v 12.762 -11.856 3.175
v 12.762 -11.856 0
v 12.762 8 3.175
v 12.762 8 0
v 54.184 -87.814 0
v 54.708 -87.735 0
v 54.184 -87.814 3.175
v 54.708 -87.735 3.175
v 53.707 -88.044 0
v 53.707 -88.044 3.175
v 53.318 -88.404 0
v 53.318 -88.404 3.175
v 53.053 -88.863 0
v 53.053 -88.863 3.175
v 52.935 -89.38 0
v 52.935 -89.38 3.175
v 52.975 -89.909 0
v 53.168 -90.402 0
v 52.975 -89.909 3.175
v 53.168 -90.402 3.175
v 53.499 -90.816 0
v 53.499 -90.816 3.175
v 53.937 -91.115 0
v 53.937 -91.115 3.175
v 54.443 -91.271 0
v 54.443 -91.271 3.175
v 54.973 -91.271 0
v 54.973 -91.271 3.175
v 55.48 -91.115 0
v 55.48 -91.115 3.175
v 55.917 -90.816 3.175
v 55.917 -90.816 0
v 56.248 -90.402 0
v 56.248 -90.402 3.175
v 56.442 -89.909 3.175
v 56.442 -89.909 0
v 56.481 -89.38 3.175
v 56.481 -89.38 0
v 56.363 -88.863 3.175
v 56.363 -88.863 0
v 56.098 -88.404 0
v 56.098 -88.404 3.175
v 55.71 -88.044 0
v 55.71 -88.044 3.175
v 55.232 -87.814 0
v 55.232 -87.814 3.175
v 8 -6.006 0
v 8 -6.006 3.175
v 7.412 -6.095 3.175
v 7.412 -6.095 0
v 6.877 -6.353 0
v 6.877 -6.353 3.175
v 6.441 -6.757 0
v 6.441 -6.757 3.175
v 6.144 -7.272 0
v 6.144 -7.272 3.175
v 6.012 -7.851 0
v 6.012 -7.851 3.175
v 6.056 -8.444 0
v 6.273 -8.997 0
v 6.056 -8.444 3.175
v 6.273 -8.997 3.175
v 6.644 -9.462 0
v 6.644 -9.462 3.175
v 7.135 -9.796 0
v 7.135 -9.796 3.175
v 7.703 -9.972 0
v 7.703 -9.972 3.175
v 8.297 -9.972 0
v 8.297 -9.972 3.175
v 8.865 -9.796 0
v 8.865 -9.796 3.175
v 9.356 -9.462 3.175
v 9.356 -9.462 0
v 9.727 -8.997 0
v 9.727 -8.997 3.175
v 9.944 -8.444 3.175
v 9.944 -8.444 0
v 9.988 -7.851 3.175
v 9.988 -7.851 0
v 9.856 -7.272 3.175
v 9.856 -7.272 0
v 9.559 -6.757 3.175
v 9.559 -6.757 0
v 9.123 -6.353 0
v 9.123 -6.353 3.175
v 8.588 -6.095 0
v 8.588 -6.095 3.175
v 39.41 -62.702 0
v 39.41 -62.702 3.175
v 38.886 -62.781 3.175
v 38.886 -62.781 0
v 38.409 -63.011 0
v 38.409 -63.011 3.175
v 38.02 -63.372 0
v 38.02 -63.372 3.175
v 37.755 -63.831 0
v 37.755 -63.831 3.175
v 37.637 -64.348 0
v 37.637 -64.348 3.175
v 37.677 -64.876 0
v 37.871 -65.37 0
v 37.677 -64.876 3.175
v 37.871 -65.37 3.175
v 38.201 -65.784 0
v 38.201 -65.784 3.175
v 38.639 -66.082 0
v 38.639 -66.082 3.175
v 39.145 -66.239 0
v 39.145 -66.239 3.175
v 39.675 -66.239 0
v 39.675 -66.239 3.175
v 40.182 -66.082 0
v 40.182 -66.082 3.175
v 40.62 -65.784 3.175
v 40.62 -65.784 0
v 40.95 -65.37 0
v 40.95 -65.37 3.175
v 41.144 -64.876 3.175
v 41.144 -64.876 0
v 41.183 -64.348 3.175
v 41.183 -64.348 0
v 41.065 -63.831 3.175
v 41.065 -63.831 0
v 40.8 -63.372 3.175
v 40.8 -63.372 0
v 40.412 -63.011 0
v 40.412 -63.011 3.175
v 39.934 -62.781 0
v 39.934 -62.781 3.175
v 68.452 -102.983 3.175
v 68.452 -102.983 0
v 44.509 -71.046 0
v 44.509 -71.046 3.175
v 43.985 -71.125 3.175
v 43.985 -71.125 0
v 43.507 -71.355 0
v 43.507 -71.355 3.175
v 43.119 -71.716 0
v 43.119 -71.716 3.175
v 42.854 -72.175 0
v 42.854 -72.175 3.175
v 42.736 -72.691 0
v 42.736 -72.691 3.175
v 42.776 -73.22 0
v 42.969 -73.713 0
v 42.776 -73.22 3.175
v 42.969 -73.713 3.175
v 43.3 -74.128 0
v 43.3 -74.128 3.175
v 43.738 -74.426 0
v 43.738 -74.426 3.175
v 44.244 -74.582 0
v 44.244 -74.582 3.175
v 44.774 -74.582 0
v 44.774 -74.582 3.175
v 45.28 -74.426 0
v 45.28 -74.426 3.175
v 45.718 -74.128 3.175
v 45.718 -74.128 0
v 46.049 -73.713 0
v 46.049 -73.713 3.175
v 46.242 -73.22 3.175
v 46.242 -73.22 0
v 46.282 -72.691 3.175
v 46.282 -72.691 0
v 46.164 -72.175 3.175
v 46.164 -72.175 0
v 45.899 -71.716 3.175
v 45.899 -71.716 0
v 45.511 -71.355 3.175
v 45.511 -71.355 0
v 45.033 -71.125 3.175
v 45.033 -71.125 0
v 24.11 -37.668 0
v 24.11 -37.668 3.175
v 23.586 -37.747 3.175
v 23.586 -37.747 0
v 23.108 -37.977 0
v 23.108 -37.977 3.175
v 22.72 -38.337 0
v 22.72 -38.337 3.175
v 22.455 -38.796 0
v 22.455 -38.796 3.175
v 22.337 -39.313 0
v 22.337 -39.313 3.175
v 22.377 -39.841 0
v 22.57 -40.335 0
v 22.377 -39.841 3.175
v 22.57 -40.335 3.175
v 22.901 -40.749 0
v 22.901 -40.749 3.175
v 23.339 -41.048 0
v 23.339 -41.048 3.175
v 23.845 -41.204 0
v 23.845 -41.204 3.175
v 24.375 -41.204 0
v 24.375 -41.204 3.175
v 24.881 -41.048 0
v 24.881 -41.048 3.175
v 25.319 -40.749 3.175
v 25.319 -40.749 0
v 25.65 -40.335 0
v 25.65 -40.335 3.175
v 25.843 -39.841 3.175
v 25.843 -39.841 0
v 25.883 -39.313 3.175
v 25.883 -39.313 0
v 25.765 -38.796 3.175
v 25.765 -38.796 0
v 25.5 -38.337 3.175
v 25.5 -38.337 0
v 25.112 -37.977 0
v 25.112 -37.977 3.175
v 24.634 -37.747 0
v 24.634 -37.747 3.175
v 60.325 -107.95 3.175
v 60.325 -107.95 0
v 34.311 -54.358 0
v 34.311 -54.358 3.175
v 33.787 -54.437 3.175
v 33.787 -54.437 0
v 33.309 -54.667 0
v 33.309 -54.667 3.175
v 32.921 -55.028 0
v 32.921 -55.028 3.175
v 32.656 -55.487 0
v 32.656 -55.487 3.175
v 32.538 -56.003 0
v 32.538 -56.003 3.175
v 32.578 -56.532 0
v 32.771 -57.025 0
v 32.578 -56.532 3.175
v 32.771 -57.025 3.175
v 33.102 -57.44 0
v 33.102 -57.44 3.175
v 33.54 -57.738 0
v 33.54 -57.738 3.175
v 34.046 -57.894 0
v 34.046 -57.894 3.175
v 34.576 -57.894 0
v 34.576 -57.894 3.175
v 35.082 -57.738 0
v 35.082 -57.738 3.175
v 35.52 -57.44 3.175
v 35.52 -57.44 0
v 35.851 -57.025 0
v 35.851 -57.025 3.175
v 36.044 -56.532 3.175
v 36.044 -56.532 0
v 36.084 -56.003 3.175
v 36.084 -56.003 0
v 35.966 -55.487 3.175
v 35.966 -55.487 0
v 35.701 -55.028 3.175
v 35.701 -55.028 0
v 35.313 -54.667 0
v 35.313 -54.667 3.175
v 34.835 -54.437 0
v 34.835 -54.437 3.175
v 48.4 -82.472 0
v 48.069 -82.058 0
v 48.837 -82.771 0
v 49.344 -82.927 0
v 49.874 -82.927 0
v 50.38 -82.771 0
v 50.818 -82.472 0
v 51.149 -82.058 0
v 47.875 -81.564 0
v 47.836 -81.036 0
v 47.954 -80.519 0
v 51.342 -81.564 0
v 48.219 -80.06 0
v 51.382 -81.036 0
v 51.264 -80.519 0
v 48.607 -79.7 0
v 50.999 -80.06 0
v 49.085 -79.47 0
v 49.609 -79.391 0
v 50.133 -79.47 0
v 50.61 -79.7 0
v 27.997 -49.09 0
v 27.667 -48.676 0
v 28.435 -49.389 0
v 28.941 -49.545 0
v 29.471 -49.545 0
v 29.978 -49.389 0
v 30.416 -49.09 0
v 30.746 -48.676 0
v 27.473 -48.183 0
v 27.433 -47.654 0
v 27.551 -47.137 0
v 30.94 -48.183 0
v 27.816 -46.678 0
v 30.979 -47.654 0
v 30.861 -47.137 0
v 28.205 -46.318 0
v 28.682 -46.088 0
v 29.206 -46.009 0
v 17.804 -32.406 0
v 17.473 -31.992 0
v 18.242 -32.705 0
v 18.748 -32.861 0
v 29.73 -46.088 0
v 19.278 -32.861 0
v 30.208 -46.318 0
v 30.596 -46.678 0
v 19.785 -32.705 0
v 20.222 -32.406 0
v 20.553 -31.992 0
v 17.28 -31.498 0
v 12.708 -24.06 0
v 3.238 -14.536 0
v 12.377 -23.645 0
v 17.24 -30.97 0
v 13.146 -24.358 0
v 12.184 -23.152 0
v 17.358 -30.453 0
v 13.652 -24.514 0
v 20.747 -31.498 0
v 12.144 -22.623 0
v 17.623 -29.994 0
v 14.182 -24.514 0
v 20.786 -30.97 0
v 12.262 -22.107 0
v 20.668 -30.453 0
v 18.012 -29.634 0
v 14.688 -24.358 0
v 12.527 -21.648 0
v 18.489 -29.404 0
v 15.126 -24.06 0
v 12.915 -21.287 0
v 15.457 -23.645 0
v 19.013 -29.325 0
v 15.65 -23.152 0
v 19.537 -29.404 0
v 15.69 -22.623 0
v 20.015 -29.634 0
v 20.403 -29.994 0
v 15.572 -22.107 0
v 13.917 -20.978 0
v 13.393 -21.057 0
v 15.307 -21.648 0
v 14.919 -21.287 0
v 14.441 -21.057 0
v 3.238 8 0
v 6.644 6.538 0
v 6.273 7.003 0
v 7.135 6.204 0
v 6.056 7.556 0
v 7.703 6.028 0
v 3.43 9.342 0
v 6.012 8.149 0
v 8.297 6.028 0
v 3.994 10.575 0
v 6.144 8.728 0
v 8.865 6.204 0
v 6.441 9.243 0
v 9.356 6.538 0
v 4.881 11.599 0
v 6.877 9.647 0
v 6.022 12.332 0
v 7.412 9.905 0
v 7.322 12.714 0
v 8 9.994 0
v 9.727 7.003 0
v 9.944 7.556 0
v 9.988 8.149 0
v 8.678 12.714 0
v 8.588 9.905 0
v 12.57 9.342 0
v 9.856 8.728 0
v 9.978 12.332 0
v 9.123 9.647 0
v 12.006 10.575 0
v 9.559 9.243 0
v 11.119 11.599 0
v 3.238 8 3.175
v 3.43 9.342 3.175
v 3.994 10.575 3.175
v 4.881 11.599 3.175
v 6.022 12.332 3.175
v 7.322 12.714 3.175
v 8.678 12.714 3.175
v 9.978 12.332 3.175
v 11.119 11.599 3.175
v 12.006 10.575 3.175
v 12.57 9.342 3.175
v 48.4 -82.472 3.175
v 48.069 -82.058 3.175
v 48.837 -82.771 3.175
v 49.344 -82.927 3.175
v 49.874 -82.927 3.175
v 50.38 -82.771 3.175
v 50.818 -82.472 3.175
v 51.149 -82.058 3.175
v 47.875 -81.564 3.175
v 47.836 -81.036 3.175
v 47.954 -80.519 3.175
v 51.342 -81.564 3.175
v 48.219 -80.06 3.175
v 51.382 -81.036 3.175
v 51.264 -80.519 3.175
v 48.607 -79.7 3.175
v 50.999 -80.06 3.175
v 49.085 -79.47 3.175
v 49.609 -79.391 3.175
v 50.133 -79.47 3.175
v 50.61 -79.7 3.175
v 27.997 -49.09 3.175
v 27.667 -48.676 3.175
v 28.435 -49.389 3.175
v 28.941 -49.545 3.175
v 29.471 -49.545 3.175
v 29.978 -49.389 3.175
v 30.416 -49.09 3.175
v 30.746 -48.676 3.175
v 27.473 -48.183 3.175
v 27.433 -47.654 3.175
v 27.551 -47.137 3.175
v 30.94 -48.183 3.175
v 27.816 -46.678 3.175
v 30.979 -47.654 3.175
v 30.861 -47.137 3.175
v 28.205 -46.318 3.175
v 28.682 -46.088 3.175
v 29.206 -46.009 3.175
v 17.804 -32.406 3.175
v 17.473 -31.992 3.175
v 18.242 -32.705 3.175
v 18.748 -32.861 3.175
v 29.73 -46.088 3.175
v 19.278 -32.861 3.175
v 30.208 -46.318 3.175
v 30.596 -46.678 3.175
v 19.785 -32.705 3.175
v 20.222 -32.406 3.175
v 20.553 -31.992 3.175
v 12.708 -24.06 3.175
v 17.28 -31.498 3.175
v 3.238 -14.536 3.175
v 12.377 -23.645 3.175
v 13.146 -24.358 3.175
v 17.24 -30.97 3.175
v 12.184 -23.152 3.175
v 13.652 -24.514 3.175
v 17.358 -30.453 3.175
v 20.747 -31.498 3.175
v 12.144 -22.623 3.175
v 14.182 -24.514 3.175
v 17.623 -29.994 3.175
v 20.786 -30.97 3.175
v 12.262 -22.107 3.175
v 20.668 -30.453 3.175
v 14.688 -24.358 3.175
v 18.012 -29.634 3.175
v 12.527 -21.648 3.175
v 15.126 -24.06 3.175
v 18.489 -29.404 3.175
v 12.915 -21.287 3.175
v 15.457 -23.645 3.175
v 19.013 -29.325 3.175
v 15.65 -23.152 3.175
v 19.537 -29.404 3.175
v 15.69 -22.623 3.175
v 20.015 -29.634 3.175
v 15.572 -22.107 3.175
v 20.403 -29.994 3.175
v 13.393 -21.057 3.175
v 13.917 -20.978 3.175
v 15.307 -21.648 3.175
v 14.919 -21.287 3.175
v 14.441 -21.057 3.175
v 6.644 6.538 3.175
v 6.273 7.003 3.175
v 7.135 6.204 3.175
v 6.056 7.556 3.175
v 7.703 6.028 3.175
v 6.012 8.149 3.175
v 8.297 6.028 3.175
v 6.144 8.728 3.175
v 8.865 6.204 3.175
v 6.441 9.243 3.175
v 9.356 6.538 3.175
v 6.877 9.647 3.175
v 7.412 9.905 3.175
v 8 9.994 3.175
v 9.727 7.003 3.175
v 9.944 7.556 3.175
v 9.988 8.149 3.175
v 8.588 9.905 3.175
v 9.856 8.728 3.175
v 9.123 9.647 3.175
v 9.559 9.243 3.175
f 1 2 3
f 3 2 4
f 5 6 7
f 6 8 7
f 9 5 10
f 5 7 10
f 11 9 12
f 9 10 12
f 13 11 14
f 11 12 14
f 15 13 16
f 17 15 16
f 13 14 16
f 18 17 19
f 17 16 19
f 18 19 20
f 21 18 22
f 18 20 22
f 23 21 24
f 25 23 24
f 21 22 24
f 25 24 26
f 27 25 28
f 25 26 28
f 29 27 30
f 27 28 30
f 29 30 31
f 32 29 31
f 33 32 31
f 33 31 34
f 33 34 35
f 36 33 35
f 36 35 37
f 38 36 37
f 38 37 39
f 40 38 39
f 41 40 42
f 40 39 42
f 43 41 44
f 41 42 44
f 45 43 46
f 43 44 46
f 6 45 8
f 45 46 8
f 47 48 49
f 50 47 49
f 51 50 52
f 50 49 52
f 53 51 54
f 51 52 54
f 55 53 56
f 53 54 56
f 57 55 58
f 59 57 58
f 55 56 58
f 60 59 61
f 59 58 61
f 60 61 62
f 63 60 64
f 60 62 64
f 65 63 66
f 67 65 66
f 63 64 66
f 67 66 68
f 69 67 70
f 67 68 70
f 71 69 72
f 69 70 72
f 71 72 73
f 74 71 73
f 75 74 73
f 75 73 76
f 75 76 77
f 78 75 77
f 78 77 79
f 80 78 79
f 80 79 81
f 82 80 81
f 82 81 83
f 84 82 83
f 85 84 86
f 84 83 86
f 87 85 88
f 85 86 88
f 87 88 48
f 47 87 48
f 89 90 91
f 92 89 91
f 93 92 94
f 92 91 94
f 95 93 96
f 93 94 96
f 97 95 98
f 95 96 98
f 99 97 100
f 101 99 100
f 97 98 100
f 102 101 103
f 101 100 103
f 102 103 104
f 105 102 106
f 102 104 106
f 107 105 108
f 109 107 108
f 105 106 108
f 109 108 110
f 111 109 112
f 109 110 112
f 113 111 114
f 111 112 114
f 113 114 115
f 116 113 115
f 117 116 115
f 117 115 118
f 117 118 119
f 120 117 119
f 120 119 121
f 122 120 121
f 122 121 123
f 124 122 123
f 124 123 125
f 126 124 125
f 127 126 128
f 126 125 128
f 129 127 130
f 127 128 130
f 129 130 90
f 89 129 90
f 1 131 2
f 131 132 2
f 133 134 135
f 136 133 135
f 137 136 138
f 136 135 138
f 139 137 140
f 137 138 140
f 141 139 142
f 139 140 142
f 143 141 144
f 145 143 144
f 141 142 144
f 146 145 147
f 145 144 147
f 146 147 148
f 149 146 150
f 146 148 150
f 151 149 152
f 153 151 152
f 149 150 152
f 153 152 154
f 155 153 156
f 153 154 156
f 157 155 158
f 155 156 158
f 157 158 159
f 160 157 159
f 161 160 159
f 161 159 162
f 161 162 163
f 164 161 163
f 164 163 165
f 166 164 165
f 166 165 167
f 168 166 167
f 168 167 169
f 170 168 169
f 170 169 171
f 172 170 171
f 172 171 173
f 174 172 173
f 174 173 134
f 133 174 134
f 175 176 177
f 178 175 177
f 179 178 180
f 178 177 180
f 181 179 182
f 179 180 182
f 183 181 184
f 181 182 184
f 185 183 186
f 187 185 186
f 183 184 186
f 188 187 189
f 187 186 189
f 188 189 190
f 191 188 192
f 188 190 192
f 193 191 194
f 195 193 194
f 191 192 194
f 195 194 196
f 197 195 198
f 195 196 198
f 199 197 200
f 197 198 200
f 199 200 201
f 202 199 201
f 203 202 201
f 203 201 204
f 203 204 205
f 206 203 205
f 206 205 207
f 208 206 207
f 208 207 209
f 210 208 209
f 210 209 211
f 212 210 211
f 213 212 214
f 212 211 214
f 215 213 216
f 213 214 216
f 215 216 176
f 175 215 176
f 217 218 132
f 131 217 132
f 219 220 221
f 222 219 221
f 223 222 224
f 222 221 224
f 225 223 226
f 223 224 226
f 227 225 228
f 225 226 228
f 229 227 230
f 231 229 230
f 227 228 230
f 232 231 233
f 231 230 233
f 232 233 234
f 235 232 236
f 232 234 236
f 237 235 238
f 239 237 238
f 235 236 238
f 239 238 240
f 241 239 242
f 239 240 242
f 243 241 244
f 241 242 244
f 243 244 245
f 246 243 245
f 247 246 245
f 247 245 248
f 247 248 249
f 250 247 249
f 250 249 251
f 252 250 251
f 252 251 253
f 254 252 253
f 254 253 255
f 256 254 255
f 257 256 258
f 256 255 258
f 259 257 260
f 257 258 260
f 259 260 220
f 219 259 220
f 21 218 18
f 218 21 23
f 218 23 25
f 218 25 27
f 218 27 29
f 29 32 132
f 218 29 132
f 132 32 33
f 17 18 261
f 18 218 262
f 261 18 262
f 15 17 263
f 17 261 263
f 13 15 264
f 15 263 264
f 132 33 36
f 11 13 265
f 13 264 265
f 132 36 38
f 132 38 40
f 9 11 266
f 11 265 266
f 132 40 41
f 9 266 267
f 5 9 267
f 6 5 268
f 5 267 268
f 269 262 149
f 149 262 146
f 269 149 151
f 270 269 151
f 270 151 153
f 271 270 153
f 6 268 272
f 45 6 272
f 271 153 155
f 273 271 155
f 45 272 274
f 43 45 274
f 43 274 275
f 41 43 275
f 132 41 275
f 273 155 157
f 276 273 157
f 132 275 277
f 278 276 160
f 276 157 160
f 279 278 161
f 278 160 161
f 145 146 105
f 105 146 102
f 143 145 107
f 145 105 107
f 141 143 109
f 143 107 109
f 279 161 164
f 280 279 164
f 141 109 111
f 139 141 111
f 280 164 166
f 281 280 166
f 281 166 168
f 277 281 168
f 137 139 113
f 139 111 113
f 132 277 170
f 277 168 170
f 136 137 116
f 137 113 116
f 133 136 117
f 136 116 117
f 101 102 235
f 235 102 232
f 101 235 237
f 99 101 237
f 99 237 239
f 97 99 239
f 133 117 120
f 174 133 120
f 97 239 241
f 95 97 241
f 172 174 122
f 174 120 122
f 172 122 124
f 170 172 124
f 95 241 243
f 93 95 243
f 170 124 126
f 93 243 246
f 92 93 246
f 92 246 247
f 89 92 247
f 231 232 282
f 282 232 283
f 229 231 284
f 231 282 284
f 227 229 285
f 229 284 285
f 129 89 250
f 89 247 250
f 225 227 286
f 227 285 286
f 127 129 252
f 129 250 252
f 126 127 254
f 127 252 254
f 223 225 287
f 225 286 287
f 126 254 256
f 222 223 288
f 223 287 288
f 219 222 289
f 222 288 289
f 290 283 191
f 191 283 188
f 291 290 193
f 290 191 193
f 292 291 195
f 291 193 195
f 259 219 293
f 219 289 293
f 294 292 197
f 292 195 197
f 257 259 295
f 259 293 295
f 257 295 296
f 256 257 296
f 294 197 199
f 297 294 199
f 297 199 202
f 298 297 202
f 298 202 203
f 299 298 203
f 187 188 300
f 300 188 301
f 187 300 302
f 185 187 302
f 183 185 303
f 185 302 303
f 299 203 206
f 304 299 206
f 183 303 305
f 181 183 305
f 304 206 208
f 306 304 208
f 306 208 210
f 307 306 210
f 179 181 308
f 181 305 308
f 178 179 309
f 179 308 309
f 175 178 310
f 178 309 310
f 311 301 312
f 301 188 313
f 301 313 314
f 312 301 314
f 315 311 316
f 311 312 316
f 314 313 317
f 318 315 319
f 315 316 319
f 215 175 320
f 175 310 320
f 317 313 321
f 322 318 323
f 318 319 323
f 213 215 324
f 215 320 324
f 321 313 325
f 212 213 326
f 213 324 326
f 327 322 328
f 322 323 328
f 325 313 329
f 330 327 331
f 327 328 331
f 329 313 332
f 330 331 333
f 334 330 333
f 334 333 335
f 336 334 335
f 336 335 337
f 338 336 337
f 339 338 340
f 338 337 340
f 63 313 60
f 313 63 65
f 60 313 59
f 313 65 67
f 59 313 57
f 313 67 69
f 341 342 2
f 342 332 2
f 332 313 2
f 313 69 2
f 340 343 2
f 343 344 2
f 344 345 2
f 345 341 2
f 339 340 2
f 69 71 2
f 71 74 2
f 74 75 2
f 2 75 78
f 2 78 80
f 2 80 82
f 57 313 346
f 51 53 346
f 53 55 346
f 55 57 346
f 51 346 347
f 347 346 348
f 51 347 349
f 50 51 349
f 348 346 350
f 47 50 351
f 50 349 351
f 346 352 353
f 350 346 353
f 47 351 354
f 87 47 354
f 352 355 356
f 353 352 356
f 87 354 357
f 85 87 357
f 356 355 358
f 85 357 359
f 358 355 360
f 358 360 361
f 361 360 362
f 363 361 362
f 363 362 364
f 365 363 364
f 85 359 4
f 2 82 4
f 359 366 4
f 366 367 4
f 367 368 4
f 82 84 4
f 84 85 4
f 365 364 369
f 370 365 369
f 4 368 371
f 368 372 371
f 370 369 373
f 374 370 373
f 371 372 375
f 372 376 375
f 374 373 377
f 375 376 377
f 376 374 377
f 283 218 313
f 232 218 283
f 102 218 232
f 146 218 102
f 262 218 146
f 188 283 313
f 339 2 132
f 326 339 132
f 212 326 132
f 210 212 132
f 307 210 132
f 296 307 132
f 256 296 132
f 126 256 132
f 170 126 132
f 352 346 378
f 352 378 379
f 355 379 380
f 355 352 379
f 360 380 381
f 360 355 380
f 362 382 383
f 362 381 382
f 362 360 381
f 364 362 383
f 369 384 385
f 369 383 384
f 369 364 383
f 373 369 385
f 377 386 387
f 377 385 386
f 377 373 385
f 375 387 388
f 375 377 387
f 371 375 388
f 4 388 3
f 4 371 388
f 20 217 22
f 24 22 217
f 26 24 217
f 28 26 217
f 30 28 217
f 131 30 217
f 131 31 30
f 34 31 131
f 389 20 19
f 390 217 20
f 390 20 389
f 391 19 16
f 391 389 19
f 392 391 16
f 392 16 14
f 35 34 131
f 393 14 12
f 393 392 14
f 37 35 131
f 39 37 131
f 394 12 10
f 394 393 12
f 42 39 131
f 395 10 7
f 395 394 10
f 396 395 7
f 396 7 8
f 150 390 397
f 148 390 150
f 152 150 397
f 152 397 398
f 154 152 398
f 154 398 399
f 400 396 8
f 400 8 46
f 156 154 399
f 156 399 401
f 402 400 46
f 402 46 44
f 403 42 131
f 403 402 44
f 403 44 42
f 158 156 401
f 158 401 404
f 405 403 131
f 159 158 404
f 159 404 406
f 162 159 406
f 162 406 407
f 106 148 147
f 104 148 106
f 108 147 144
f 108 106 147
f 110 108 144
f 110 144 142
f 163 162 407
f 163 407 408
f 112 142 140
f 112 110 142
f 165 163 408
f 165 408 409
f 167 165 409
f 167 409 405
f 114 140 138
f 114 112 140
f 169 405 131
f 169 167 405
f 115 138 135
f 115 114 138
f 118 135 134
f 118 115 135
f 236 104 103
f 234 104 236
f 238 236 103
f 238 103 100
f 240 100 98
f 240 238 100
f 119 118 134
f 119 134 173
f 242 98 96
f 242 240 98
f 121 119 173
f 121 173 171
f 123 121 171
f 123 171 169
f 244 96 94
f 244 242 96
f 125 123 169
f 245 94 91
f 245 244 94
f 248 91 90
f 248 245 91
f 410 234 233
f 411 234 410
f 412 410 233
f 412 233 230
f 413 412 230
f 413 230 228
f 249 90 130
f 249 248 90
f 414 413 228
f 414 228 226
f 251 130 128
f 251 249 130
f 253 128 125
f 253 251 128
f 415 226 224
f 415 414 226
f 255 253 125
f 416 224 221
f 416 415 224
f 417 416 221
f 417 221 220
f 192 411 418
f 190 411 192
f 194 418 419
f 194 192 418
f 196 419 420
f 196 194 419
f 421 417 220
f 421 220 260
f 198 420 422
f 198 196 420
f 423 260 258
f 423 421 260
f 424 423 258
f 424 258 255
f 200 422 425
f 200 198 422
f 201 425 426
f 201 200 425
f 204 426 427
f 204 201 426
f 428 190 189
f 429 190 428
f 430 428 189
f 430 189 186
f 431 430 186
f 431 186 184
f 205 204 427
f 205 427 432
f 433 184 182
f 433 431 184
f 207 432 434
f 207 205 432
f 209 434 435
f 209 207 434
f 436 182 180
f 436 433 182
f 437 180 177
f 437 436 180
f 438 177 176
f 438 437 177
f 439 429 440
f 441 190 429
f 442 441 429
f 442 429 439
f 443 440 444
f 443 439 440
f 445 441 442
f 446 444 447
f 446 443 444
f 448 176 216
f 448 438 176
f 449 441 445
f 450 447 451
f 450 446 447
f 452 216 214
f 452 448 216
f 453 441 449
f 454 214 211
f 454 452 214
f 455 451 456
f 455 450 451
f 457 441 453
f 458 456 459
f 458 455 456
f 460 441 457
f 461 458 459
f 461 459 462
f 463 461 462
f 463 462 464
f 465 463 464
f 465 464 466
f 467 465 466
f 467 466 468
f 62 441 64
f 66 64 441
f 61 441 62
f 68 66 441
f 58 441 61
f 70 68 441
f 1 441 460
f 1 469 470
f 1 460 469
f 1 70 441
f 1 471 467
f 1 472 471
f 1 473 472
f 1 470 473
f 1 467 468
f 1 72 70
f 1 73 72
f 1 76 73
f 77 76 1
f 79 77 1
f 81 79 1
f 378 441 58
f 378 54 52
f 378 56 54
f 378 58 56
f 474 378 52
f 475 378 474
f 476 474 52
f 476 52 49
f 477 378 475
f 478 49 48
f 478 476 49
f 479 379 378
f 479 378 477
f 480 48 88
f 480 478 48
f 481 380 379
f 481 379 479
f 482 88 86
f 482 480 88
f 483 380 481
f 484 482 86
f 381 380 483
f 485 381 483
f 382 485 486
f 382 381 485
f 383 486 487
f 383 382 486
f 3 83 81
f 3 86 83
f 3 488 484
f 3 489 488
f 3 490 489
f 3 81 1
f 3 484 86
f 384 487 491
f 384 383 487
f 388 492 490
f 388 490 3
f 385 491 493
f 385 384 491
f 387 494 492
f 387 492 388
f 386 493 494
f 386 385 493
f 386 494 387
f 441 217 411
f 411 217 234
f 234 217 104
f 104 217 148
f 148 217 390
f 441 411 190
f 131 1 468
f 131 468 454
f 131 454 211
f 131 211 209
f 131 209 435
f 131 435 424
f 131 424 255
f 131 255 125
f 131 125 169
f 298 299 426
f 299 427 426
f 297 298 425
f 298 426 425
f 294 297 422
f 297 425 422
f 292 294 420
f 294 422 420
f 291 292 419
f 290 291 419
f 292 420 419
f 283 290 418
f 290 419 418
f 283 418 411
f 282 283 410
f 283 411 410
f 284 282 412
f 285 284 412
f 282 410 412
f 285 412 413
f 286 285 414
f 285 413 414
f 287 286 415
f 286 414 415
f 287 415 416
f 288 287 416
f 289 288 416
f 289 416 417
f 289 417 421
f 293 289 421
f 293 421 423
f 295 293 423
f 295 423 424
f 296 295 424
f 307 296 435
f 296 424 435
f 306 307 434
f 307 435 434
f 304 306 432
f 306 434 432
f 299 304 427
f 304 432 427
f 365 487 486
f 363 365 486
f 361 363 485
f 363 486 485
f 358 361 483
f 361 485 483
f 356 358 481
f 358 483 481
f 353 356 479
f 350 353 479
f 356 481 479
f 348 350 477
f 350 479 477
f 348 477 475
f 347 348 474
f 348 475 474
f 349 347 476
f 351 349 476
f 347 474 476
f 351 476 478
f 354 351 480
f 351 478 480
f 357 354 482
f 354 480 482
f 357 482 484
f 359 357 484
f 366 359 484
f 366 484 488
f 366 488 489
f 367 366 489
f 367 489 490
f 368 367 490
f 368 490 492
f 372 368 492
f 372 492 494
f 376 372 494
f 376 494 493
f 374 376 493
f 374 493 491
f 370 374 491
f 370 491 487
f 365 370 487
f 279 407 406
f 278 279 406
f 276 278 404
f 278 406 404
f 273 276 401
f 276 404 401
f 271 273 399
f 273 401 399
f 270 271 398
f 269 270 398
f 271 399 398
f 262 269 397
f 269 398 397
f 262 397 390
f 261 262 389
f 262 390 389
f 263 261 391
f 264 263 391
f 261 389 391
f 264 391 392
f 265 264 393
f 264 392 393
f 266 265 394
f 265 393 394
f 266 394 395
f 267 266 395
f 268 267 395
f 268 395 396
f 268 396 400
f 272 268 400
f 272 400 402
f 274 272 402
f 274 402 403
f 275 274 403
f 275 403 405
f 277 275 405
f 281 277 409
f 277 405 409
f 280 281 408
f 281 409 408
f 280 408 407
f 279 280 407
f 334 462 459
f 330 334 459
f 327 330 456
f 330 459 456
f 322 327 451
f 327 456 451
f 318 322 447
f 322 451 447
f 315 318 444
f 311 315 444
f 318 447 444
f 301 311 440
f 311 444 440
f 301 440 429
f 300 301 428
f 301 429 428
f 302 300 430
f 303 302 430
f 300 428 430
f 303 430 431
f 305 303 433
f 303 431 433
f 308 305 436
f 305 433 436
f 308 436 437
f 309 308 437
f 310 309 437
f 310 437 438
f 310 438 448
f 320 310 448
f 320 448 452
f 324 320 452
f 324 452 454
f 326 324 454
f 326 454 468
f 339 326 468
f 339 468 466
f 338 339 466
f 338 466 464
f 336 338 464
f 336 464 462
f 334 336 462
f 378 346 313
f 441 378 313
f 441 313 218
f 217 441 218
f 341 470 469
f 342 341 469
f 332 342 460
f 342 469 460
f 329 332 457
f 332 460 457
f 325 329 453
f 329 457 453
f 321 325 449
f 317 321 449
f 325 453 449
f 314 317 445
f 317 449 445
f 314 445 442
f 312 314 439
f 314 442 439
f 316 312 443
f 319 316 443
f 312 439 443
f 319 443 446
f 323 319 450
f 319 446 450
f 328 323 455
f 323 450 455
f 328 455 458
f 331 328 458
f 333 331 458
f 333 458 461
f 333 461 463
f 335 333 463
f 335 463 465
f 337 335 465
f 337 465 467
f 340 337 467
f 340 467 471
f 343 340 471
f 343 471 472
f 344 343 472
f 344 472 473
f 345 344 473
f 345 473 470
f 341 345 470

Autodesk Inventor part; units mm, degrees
ref_plane "YZ Plane" through (0, 0, 0) normal (1, 0, 0) x (0, 1, 0)
ref_plane "XZ Plane" through (0, 0, 0) normal (0, 1, 0) x (-1, 0, 0)
ref_plane "XY Plane" through (0, 0, 0) normal (0, 0, 1) x (1, 0, 0)
sketch "Sketch1" plane through (0, 0, 0) normal (0, 0, 1) x (1, 0, 0)
  arc A0 (6.0118, 7.7827) -> (6.4404, 9.2521) centre (8, 8) ccw construction
  arc A1 (7.7827, -6.0118) -> (9.2521, -6.4404) centre (8, -8) ccw construction
  circle A2 centre (8, 8) radius 1.9939 construction
  circle A3 centre (8, -8) radius 1.9939 construction
  line L0 (6.0061, 8) -> (6.0061, -8) construction
  line L1 (1.9277, 2.1329) -> (2.8194, -0.5629) construction
  arc A4 (1.9277, 2.1329) -> (2.8194, -0.5629) centre (0, 0) ccw construction
  line L2 (9.9939, 8) -> (6.0061, 8) construction
  line L3 (6.0061, 8) -> (6.0061, -8) construction
  line L4 (6.0061, -8) -> (9.9939, -8) construction
  line L5 (9.9939, -8) -> (9.9939, 8) construction
  arc A5 (12.7621, 7.9367) -> (3.2375, 8) centre (8, 8) ccw construction
  line L6 (8, 8) -> (3.2375, 8) construction
  line L7 (8, 8) -> (12.7625, 8) construction
  line L8 (12.7625, 10.7686) -> (3.2375, 10.7686) construction
  line L9 (3.2375, 10.7686) -> (3.2375, -14.5363) construction
  line L10 (3.2375, -10.7686) -> (12.7625, -10.7686) construction
  line L11 (12.7625, -11.6614) -> (12.7625, 10.7686) construction
  line L12 (12.7625, 8) -> (12.7625, -11.6614) construction
  line L13 (3.2375, 8) -> (3.2375, -14.5363) construction
  line L14 (125.2938, -2.5112) -> (119.3124, -4.6433) construction
  line L15 (120.3686, -7.6063) -> (119.3124, -4.6433) construction
  circle A6 centre (64.263, -105.1393) radius 2 construction
  circle A7 centre (0, 0) radius 1.9939 construction
  line L16 (64.263, -105.1393) -> (0, 0) construction
  line L17 (0, 0) -> (-1.7037, -1.0359) construction
  line L18 (0, 0) -> (1.9939, 0) construction
  line L19 (0, 0) -> (1.7037, 1.0359) construction
  line L20 (64.263, -105.1393) -> (62.5541, -106.1783) construction
  line L21 (64.263, -105.1393) -> (66.263, -105.1393) construction
  line L22 (64.263, -105.1393) -> (65.9719, -104.1002) construction
  line L23 (1.7037, 1.0359) -> (65.9719, -104.1002) construction
  line L24 (65.9719, -104.1002) -> (62.5591, -106.1865) construction
  line L25 (62.5591, -106.1865) -> (-1.7091, -1.0504) construction
  line L26 (-1.7091, -1.0504) -> (1.7037, 1.0359) construction
  line L27 (-5.5766, -0.1174) -> (61.6261, -110.0539) construction
  line L28 (61.6261, -110.0539) -> (69.8394, -105.0332) construction
  line L29 (69.8394, -105.0332) -> (0.7437, 8) construction
  line L30 (2.6367, 4.9033) -> (-5.5766, -0.1174) construction
  line L31 (64.263, -105.1393) -> (68.3721, -102.633) construction
  line L32 (12.7625, -11.6614) -> (68.3721, -102.633) construction
  line L33 (64.263, -105.1393) -> (60.1589, -107.6537) construction
  line L34 (68.3721, -102.633) -> (60.1589, -107.6537) construction
  line L35 (60.1589, -107.6537) -> (3.2375, -14.5363) construction
  arc A8 (25.7824, -64.2706) -> (22.8, -65.3296) centre (24.3335, -64.9192) ccw construction
  circle A9 centre (43.9887, -120.2705) radius 1.5 construction
  circle A10 centre (43.9887, -120.2705) radius 60.325 construction
  circle A11 centre (34.3115, -56.1364) radius 1.778 construction
  circle A12 centre (8, 8) radius 4.7625
  line L36 (12.7625, -11.6614) -> (3.2375, -14.5363)
  line L37 (3.2375, -14.5363) -> (60.1589, -107.6537)
  line L38 (60.1589, -107.6537) -> (68.3721, -102.633)
  line L39 (68.3721, -102.633) -> (12.7625, -11.6614)
  circle A13 centre (34.3115, -56.1364) radius 1.778
  circle A14 centre (13.9136, -22.7595) radius 1.778
  circle A15 centre (19.013, -31.1037) radius 1.778
  circle A16 centre (24.1123, -39.4479) radius 1.778
  circle A17 centre (29.2117, -47.7921) radius 1.778
  circle A18 centre (39.4103, -64.4804) radius 1.778
  circle A19 centre (44.5097, -72.8246) radius 1.778
  circle A20 centre (49.609, -81.1688) radius 1.778
  circle A21 centre (54.7084, -89.513) radius 1.778
  circle A22 centre (8, -8) radius 1.9939
  circle A23 centre (8, 8) radius 1.9939
  point P0 (0, 0)
  dimension "d1" = 3.9878
  dimension "d0" = 3.9878
  dimension "d3" = 4.7625
  dimension "d4" = 180
  dimension "d5" = 2.7686
  dimension "d6" = 3.9878
  dimension "d7" = 148.7
  dimension "d8" = 148.7
  dimension "d9" = 2.8131
  dimension "d11" = 3.556
  dimension "d98" = 3.9878
  dimension "d99" = 3.9878
extrude "Extrusion1" add sketch "Sketch1" along normal blind 3.175 contours A12 | A23
ref_plane "Work Plane1" through (0, 0, 0) normal (0, 0, 1) x (1, 0, 0)
sketch "Sketch2" plane through (0, 0, 0) normal (0, 0, 1) x (1, 0, 0)
  circle A0 centre (8, 8) radius 4.7625 projected
  line L0 (12.7625, 8) -> (3.2375, 8)
  line L1 (3.2375, 8) -> (3.2375, -14.5363)
  line L2 (3.2375, -14.5363) -> (12.7625, -14.5363)
  line L3 (12.7625, -14.5363) -> (12.7625, 8)
  line L4 (3.2375, -14.5363) -> (60.325, -107.95)
  line L5 (60.325, -107.95) -> (68.4525, -102.9831)
  line L6 (68.4525, -102.9831) -> (11.365, -9.5694)
  line L7 (11.365, -9.5694) -> (3.2375, -14.5363)
  point P0 (0, 0)
  dimension "d14" = 9.525
extrude "Extrusion2" add sketch "Sketch2" along normal blind 3.175 contours L3 L6 L7 L1 A0 | A0 L0 | L6 L5 L4 L2 L3 | L3 L2 L7 L6 picked at (6.8117, 6.9473)
hole "Hole1" at (34.311, -56.1362, 0) direction (0, 0, 1) diameter 3.556 end through all
hole "Hole2" at (49.6089, -81.1686, 0) direction (0, 0, 1) diameter 3.556 end through all
hole "Hole3" at (44.509, -72.8243, 0) direction (0, 0, 1) diameter 3.556 end through all
hole "Hole4" at (54.7081, -89.5129, 0) direction (0, 0, 1) diameter 3.556 end through all
hole "Hole5" at (39.4103, -64.4805, 0) direction (0, 0, 1) diameter 3.556 end through all
hole "Hole6" at (29.2063, -47.787, 0) direction (0, 0, 1) diameter 3.556 end through all
hole "Hole7" at (24.11, -39.4457, 0) direction (0, 0, 1) diameter 3.556 end through all
hole "Hole8" at (19.0131, -31.1028, 0) direction (0, 0, 1) diameter 3.556 end through all
hole "Hole9" at (13.917, -22.7563, 0) direction (0, 0, 1) diameter 3.556 end through all
sketch "Sketch3" plane through (60.325, -107.95, 0) normal (-0.8533, -0.5215, 0) x (0, 0, 1)
  point P0 (0, 123.5682)
sketch "Sketch4" plane through (0, 0, 3.175) normal (0, 0, 1) x (1, 0, 0)
  spline S0 degree 3 poles (-25.2788, -2.0557) (-25.3112, -1.9605) (-25.3341, -1.8916) (-25.3588, -1.8128) (-25.3613, -1.8009) (-25.3441, -1.8374) (-25.3155, -1.9119) (-25.2521, -2.0803) (-25.2004, -2.2209) (-25.0761, -2.5633) (-25.0055, -2.7599) (-24.8596, -3.169) (-24.7792, -3.3953) (-24.6138, -3.8659) (-24.5358, -4.0898) (-24.3927, -4.5052) (-24.3289, -4.6925) (-24.2382, -4.9635) (-24.1921, -5.103) (-24.1408, -5.2711) (-24.1321, -5.3068) (-24.1428, -5.2998) (-24.1636, -5.2531) (-24.2396, -5.0631) (-24.2901, -4.9305) (-24.3621, -4.7401) (-24.4003, -4.6379) (-24.4829, -4.4155) (-24.5269, -4.296) (-24.5725, -4.1714) knots 0.000001 0.000001 0.000001 0.000001 0.060915 0.060915 0.118968 0.118968 0.203575 0.203575 0.324675 0.324675 0.441995 0.441995 0.548902 0.548902 0.648718 0.648718 0.748605 0.748605 0.82225 0.82225 0.878767 0.878767 0.938156 0.938156 1.008318 1.008318 1.073219 1.073219 1.138691 1.138691 1.138691 1.138691
  point P0 (0, 0)
sketch "Sketch5" plane through (0, 0, 0) normal (0, 0, -1) x (-1, 0, 0)
  arc A0 (-9.9544, 7.5753) -> (-9.6822, 9.0817) centre (-8, 8) ccw projected
  arc A1 (-7.5753, -9.9544) -> (-9.0817, -9.6822) centre (-8, -8) ccw
  circle A2 centre (-8, 8) radius 2
  circle A3 centre (-8, -8) radius 2
  point P0 (0, 0)
hole "Hole10" at (8, -8, 0) direction (0, 0, 1) diameter 3.9878 end through all
hole "Hole11" at (8, 8, 0) direction (0, 0, 1) diameter 3.9878 end through all
sketch "Sketch6" plane through (0, 0, 3.175) normal (0, 0, 1) x (1, 0, 0)
  point P0 (0, 0)
sketch "Sketch7" plane through (0, 0, 3.175) normal (0, 0, 1) x (1, 0, 0)
  circle A0 centre (19.0131, -31.1028) radius 1.778 construction
  circle A1 centre (13.917, -22.7563) radius 1.778 construction
  line L0 (19.0131, -31.1028) -> (13.917, -22.7563) construction
  point P0 (0, 0)
properties part number "CollectorArmWithAngle"
